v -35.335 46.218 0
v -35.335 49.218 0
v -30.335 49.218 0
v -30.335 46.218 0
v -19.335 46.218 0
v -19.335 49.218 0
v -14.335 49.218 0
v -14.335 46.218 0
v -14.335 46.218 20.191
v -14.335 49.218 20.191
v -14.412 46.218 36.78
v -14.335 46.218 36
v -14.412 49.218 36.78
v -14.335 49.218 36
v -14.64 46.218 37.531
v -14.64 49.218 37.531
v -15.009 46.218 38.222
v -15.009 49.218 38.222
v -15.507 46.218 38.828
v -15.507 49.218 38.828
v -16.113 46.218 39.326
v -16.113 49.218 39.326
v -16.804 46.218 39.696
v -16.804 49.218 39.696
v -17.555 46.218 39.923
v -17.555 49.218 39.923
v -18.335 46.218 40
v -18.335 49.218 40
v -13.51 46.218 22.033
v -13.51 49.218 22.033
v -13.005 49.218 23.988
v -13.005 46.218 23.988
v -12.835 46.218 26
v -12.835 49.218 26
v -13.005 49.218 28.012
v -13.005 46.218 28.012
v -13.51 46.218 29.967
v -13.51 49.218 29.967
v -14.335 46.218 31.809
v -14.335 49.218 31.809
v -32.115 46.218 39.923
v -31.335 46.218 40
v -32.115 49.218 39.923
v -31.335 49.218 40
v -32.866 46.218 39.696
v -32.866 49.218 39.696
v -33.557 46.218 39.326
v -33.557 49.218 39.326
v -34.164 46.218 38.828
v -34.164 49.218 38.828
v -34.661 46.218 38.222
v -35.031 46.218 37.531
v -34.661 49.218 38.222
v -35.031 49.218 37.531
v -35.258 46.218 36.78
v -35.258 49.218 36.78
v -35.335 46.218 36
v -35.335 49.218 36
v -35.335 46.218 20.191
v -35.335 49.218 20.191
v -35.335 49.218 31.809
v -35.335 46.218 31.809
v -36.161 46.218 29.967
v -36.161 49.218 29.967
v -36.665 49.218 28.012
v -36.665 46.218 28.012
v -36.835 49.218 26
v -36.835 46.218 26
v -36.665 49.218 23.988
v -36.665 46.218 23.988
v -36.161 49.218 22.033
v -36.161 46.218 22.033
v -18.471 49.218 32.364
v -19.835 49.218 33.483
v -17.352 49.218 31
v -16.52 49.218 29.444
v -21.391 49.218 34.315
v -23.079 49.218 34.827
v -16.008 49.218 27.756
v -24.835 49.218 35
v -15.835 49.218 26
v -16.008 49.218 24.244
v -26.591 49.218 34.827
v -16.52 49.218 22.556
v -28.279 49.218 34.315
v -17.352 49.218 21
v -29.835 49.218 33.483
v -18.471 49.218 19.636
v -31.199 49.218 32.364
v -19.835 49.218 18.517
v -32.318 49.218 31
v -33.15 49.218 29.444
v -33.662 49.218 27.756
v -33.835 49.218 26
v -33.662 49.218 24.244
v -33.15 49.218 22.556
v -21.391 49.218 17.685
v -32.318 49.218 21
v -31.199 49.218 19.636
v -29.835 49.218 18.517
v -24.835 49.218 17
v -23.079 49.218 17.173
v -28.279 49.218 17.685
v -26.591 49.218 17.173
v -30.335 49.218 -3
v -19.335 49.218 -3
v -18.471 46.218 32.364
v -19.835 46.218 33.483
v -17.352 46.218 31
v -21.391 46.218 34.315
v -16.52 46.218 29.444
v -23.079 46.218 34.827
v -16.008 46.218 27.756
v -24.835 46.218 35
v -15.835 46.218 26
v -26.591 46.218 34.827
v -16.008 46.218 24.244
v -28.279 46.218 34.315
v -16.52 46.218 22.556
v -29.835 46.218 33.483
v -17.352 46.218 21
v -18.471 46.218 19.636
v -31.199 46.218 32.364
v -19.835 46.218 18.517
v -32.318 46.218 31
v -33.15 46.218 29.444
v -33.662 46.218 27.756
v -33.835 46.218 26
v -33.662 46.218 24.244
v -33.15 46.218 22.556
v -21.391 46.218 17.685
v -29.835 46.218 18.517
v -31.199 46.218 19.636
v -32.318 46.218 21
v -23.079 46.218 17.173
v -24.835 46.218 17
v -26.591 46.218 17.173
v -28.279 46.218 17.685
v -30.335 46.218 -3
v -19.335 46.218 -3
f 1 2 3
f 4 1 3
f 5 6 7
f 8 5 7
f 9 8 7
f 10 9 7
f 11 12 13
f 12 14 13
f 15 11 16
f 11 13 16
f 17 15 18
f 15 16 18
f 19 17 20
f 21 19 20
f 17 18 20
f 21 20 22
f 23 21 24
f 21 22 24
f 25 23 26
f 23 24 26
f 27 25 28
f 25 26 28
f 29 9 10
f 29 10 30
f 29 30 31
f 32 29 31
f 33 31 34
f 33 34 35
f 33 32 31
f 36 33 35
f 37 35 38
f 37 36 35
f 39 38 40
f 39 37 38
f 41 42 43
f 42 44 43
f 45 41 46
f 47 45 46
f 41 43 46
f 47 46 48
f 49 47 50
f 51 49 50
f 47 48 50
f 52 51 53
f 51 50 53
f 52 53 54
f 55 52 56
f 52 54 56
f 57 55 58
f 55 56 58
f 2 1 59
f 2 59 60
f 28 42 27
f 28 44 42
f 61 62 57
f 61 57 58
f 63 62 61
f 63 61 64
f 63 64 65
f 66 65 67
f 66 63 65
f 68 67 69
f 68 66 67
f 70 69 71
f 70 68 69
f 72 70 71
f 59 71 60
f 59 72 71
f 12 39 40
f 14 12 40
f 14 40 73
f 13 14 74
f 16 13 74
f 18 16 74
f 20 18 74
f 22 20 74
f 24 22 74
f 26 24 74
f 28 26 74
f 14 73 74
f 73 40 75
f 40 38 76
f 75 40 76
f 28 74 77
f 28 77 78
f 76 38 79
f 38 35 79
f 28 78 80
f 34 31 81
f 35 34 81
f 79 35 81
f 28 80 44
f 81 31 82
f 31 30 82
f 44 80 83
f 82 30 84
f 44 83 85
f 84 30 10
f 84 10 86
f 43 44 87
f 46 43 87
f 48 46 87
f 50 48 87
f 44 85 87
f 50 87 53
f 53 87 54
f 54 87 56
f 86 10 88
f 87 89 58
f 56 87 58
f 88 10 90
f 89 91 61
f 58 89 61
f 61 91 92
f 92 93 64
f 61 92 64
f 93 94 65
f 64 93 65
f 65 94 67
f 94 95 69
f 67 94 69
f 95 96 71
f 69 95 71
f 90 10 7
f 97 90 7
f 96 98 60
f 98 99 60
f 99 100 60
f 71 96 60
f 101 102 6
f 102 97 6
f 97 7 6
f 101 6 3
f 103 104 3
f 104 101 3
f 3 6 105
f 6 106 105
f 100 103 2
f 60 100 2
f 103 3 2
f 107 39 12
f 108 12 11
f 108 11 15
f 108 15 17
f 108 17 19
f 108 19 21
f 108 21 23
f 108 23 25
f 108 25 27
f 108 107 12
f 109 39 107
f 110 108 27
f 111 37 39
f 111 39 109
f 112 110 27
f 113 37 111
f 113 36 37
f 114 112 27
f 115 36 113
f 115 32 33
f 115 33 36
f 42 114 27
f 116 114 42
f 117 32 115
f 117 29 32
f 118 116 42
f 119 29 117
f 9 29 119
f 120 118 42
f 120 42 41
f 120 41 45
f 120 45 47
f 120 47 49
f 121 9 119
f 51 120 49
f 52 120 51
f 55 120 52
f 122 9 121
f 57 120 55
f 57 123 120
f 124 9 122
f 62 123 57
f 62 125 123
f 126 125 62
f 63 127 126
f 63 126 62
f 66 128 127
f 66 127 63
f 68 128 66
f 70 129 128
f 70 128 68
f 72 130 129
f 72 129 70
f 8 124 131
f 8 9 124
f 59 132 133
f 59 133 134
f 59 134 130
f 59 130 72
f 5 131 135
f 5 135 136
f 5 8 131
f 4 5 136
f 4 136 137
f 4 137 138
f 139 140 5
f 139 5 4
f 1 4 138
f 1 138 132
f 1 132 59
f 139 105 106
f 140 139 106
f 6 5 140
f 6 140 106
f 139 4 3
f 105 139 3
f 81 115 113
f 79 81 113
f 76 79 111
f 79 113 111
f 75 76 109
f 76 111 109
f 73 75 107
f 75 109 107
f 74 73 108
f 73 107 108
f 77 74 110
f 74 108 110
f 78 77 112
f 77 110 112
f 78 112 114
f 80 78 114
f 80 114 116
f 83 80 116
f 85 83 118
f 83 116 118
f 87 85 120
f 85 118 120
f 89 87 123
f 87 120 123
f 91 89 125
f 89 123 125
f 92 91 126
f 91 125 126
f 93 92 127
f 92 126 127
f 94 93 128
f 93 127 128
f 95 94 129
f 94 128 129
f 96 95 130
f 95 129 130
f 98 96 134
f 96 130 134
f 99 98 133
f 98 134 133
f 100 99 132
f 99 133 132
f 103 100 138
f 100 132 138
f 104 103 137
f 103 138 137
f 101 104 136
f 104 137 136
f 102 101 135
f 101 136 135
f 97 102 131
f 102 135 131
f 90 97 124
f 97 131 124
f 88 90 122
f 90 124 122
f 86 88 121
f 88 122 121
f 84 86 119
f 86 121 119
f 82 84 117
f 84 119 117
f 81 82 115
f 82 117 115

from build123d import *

# Parameters (mm, degrees)
CROQUIS1_W              = 11
CROQUIS1_H              = 3
SALIENTE_EXTRUIR1_DEPTH = 3
CROQUIS2_W              = 21
CROQUIS2_H              = 3
SALIENTE_EXTRUIR2_DEPTH = 40
CROQUIS3_R              = 9
CORTAR_EXTRUIR1_DEPTH   = 10
CROQUIS4_R              = 12
CROQUIS4_R_2            = 9
SALIENTE_EXTRUIR3_DEPTH = 3
REDONDEO1_R             = 4


with BuildPart() as part:
    # Croquis1 → Saliente-Extruir1 (new body)
    with BuildSketch(Plane.XY):
        with Locations((-24.835128068, 47.717862768)):
            Rectangle(CROQUIS1_W, CROQUIS1_H)
    extrude(amount=-SALIENTE_EXTRUIR1_DEPTH)

    # Croquis2 → Saliente-Extruir2 (add)
    with BuildSketch(Plane.XY):
        with Locations((-24.835128068, 47.717862768)):
            Rectangle(CROQUIS2_W, CROQUIS2_H)
    extrude(amount=SALIENTE_EXTRUIR2_DEPTH)

    # Croquis3 → Cortar-Extruir1 (cut)
    with BuildSketch(Plane.XZ.offset(-46.217862768)):
        with Locations((-24.835128068, 26)):
            Circle(CROQUIS3_R)
    extrude(amount=-CORTAR_EXTRUIR1_DEPTH, mode=Mode.SUBTRACT)

    # Croquis4 → Saliente-Extruir3 (add)
    with BuildSketch(Plane(origin=(0, 46.217862768, 0), x_dir=(-1, 0, 0), z_dir=(0, -1, 0))):
        with Locations((24.835128068, -26)):
            Circle(CROQUIS4_R)
        with Locations((24.835128068, -26)):
            Circle(CROQUIS4_R_2, mode=Mode.SUBTRACT)
    extrude(amount=-SALIENTE_EXTRUIR3_DEPTH)

    # Redondeo1
    redondeo1_edges = [part.edges().sort_by_distance(p)[0] for p in [
        (-35.335128068, 47.717862768, 40),
        (-14.335128068, 47.717862768, 40),
    ]]
    fillet(redondeo1_edges, radius=REDONDEO1_R)


solid = part.part
